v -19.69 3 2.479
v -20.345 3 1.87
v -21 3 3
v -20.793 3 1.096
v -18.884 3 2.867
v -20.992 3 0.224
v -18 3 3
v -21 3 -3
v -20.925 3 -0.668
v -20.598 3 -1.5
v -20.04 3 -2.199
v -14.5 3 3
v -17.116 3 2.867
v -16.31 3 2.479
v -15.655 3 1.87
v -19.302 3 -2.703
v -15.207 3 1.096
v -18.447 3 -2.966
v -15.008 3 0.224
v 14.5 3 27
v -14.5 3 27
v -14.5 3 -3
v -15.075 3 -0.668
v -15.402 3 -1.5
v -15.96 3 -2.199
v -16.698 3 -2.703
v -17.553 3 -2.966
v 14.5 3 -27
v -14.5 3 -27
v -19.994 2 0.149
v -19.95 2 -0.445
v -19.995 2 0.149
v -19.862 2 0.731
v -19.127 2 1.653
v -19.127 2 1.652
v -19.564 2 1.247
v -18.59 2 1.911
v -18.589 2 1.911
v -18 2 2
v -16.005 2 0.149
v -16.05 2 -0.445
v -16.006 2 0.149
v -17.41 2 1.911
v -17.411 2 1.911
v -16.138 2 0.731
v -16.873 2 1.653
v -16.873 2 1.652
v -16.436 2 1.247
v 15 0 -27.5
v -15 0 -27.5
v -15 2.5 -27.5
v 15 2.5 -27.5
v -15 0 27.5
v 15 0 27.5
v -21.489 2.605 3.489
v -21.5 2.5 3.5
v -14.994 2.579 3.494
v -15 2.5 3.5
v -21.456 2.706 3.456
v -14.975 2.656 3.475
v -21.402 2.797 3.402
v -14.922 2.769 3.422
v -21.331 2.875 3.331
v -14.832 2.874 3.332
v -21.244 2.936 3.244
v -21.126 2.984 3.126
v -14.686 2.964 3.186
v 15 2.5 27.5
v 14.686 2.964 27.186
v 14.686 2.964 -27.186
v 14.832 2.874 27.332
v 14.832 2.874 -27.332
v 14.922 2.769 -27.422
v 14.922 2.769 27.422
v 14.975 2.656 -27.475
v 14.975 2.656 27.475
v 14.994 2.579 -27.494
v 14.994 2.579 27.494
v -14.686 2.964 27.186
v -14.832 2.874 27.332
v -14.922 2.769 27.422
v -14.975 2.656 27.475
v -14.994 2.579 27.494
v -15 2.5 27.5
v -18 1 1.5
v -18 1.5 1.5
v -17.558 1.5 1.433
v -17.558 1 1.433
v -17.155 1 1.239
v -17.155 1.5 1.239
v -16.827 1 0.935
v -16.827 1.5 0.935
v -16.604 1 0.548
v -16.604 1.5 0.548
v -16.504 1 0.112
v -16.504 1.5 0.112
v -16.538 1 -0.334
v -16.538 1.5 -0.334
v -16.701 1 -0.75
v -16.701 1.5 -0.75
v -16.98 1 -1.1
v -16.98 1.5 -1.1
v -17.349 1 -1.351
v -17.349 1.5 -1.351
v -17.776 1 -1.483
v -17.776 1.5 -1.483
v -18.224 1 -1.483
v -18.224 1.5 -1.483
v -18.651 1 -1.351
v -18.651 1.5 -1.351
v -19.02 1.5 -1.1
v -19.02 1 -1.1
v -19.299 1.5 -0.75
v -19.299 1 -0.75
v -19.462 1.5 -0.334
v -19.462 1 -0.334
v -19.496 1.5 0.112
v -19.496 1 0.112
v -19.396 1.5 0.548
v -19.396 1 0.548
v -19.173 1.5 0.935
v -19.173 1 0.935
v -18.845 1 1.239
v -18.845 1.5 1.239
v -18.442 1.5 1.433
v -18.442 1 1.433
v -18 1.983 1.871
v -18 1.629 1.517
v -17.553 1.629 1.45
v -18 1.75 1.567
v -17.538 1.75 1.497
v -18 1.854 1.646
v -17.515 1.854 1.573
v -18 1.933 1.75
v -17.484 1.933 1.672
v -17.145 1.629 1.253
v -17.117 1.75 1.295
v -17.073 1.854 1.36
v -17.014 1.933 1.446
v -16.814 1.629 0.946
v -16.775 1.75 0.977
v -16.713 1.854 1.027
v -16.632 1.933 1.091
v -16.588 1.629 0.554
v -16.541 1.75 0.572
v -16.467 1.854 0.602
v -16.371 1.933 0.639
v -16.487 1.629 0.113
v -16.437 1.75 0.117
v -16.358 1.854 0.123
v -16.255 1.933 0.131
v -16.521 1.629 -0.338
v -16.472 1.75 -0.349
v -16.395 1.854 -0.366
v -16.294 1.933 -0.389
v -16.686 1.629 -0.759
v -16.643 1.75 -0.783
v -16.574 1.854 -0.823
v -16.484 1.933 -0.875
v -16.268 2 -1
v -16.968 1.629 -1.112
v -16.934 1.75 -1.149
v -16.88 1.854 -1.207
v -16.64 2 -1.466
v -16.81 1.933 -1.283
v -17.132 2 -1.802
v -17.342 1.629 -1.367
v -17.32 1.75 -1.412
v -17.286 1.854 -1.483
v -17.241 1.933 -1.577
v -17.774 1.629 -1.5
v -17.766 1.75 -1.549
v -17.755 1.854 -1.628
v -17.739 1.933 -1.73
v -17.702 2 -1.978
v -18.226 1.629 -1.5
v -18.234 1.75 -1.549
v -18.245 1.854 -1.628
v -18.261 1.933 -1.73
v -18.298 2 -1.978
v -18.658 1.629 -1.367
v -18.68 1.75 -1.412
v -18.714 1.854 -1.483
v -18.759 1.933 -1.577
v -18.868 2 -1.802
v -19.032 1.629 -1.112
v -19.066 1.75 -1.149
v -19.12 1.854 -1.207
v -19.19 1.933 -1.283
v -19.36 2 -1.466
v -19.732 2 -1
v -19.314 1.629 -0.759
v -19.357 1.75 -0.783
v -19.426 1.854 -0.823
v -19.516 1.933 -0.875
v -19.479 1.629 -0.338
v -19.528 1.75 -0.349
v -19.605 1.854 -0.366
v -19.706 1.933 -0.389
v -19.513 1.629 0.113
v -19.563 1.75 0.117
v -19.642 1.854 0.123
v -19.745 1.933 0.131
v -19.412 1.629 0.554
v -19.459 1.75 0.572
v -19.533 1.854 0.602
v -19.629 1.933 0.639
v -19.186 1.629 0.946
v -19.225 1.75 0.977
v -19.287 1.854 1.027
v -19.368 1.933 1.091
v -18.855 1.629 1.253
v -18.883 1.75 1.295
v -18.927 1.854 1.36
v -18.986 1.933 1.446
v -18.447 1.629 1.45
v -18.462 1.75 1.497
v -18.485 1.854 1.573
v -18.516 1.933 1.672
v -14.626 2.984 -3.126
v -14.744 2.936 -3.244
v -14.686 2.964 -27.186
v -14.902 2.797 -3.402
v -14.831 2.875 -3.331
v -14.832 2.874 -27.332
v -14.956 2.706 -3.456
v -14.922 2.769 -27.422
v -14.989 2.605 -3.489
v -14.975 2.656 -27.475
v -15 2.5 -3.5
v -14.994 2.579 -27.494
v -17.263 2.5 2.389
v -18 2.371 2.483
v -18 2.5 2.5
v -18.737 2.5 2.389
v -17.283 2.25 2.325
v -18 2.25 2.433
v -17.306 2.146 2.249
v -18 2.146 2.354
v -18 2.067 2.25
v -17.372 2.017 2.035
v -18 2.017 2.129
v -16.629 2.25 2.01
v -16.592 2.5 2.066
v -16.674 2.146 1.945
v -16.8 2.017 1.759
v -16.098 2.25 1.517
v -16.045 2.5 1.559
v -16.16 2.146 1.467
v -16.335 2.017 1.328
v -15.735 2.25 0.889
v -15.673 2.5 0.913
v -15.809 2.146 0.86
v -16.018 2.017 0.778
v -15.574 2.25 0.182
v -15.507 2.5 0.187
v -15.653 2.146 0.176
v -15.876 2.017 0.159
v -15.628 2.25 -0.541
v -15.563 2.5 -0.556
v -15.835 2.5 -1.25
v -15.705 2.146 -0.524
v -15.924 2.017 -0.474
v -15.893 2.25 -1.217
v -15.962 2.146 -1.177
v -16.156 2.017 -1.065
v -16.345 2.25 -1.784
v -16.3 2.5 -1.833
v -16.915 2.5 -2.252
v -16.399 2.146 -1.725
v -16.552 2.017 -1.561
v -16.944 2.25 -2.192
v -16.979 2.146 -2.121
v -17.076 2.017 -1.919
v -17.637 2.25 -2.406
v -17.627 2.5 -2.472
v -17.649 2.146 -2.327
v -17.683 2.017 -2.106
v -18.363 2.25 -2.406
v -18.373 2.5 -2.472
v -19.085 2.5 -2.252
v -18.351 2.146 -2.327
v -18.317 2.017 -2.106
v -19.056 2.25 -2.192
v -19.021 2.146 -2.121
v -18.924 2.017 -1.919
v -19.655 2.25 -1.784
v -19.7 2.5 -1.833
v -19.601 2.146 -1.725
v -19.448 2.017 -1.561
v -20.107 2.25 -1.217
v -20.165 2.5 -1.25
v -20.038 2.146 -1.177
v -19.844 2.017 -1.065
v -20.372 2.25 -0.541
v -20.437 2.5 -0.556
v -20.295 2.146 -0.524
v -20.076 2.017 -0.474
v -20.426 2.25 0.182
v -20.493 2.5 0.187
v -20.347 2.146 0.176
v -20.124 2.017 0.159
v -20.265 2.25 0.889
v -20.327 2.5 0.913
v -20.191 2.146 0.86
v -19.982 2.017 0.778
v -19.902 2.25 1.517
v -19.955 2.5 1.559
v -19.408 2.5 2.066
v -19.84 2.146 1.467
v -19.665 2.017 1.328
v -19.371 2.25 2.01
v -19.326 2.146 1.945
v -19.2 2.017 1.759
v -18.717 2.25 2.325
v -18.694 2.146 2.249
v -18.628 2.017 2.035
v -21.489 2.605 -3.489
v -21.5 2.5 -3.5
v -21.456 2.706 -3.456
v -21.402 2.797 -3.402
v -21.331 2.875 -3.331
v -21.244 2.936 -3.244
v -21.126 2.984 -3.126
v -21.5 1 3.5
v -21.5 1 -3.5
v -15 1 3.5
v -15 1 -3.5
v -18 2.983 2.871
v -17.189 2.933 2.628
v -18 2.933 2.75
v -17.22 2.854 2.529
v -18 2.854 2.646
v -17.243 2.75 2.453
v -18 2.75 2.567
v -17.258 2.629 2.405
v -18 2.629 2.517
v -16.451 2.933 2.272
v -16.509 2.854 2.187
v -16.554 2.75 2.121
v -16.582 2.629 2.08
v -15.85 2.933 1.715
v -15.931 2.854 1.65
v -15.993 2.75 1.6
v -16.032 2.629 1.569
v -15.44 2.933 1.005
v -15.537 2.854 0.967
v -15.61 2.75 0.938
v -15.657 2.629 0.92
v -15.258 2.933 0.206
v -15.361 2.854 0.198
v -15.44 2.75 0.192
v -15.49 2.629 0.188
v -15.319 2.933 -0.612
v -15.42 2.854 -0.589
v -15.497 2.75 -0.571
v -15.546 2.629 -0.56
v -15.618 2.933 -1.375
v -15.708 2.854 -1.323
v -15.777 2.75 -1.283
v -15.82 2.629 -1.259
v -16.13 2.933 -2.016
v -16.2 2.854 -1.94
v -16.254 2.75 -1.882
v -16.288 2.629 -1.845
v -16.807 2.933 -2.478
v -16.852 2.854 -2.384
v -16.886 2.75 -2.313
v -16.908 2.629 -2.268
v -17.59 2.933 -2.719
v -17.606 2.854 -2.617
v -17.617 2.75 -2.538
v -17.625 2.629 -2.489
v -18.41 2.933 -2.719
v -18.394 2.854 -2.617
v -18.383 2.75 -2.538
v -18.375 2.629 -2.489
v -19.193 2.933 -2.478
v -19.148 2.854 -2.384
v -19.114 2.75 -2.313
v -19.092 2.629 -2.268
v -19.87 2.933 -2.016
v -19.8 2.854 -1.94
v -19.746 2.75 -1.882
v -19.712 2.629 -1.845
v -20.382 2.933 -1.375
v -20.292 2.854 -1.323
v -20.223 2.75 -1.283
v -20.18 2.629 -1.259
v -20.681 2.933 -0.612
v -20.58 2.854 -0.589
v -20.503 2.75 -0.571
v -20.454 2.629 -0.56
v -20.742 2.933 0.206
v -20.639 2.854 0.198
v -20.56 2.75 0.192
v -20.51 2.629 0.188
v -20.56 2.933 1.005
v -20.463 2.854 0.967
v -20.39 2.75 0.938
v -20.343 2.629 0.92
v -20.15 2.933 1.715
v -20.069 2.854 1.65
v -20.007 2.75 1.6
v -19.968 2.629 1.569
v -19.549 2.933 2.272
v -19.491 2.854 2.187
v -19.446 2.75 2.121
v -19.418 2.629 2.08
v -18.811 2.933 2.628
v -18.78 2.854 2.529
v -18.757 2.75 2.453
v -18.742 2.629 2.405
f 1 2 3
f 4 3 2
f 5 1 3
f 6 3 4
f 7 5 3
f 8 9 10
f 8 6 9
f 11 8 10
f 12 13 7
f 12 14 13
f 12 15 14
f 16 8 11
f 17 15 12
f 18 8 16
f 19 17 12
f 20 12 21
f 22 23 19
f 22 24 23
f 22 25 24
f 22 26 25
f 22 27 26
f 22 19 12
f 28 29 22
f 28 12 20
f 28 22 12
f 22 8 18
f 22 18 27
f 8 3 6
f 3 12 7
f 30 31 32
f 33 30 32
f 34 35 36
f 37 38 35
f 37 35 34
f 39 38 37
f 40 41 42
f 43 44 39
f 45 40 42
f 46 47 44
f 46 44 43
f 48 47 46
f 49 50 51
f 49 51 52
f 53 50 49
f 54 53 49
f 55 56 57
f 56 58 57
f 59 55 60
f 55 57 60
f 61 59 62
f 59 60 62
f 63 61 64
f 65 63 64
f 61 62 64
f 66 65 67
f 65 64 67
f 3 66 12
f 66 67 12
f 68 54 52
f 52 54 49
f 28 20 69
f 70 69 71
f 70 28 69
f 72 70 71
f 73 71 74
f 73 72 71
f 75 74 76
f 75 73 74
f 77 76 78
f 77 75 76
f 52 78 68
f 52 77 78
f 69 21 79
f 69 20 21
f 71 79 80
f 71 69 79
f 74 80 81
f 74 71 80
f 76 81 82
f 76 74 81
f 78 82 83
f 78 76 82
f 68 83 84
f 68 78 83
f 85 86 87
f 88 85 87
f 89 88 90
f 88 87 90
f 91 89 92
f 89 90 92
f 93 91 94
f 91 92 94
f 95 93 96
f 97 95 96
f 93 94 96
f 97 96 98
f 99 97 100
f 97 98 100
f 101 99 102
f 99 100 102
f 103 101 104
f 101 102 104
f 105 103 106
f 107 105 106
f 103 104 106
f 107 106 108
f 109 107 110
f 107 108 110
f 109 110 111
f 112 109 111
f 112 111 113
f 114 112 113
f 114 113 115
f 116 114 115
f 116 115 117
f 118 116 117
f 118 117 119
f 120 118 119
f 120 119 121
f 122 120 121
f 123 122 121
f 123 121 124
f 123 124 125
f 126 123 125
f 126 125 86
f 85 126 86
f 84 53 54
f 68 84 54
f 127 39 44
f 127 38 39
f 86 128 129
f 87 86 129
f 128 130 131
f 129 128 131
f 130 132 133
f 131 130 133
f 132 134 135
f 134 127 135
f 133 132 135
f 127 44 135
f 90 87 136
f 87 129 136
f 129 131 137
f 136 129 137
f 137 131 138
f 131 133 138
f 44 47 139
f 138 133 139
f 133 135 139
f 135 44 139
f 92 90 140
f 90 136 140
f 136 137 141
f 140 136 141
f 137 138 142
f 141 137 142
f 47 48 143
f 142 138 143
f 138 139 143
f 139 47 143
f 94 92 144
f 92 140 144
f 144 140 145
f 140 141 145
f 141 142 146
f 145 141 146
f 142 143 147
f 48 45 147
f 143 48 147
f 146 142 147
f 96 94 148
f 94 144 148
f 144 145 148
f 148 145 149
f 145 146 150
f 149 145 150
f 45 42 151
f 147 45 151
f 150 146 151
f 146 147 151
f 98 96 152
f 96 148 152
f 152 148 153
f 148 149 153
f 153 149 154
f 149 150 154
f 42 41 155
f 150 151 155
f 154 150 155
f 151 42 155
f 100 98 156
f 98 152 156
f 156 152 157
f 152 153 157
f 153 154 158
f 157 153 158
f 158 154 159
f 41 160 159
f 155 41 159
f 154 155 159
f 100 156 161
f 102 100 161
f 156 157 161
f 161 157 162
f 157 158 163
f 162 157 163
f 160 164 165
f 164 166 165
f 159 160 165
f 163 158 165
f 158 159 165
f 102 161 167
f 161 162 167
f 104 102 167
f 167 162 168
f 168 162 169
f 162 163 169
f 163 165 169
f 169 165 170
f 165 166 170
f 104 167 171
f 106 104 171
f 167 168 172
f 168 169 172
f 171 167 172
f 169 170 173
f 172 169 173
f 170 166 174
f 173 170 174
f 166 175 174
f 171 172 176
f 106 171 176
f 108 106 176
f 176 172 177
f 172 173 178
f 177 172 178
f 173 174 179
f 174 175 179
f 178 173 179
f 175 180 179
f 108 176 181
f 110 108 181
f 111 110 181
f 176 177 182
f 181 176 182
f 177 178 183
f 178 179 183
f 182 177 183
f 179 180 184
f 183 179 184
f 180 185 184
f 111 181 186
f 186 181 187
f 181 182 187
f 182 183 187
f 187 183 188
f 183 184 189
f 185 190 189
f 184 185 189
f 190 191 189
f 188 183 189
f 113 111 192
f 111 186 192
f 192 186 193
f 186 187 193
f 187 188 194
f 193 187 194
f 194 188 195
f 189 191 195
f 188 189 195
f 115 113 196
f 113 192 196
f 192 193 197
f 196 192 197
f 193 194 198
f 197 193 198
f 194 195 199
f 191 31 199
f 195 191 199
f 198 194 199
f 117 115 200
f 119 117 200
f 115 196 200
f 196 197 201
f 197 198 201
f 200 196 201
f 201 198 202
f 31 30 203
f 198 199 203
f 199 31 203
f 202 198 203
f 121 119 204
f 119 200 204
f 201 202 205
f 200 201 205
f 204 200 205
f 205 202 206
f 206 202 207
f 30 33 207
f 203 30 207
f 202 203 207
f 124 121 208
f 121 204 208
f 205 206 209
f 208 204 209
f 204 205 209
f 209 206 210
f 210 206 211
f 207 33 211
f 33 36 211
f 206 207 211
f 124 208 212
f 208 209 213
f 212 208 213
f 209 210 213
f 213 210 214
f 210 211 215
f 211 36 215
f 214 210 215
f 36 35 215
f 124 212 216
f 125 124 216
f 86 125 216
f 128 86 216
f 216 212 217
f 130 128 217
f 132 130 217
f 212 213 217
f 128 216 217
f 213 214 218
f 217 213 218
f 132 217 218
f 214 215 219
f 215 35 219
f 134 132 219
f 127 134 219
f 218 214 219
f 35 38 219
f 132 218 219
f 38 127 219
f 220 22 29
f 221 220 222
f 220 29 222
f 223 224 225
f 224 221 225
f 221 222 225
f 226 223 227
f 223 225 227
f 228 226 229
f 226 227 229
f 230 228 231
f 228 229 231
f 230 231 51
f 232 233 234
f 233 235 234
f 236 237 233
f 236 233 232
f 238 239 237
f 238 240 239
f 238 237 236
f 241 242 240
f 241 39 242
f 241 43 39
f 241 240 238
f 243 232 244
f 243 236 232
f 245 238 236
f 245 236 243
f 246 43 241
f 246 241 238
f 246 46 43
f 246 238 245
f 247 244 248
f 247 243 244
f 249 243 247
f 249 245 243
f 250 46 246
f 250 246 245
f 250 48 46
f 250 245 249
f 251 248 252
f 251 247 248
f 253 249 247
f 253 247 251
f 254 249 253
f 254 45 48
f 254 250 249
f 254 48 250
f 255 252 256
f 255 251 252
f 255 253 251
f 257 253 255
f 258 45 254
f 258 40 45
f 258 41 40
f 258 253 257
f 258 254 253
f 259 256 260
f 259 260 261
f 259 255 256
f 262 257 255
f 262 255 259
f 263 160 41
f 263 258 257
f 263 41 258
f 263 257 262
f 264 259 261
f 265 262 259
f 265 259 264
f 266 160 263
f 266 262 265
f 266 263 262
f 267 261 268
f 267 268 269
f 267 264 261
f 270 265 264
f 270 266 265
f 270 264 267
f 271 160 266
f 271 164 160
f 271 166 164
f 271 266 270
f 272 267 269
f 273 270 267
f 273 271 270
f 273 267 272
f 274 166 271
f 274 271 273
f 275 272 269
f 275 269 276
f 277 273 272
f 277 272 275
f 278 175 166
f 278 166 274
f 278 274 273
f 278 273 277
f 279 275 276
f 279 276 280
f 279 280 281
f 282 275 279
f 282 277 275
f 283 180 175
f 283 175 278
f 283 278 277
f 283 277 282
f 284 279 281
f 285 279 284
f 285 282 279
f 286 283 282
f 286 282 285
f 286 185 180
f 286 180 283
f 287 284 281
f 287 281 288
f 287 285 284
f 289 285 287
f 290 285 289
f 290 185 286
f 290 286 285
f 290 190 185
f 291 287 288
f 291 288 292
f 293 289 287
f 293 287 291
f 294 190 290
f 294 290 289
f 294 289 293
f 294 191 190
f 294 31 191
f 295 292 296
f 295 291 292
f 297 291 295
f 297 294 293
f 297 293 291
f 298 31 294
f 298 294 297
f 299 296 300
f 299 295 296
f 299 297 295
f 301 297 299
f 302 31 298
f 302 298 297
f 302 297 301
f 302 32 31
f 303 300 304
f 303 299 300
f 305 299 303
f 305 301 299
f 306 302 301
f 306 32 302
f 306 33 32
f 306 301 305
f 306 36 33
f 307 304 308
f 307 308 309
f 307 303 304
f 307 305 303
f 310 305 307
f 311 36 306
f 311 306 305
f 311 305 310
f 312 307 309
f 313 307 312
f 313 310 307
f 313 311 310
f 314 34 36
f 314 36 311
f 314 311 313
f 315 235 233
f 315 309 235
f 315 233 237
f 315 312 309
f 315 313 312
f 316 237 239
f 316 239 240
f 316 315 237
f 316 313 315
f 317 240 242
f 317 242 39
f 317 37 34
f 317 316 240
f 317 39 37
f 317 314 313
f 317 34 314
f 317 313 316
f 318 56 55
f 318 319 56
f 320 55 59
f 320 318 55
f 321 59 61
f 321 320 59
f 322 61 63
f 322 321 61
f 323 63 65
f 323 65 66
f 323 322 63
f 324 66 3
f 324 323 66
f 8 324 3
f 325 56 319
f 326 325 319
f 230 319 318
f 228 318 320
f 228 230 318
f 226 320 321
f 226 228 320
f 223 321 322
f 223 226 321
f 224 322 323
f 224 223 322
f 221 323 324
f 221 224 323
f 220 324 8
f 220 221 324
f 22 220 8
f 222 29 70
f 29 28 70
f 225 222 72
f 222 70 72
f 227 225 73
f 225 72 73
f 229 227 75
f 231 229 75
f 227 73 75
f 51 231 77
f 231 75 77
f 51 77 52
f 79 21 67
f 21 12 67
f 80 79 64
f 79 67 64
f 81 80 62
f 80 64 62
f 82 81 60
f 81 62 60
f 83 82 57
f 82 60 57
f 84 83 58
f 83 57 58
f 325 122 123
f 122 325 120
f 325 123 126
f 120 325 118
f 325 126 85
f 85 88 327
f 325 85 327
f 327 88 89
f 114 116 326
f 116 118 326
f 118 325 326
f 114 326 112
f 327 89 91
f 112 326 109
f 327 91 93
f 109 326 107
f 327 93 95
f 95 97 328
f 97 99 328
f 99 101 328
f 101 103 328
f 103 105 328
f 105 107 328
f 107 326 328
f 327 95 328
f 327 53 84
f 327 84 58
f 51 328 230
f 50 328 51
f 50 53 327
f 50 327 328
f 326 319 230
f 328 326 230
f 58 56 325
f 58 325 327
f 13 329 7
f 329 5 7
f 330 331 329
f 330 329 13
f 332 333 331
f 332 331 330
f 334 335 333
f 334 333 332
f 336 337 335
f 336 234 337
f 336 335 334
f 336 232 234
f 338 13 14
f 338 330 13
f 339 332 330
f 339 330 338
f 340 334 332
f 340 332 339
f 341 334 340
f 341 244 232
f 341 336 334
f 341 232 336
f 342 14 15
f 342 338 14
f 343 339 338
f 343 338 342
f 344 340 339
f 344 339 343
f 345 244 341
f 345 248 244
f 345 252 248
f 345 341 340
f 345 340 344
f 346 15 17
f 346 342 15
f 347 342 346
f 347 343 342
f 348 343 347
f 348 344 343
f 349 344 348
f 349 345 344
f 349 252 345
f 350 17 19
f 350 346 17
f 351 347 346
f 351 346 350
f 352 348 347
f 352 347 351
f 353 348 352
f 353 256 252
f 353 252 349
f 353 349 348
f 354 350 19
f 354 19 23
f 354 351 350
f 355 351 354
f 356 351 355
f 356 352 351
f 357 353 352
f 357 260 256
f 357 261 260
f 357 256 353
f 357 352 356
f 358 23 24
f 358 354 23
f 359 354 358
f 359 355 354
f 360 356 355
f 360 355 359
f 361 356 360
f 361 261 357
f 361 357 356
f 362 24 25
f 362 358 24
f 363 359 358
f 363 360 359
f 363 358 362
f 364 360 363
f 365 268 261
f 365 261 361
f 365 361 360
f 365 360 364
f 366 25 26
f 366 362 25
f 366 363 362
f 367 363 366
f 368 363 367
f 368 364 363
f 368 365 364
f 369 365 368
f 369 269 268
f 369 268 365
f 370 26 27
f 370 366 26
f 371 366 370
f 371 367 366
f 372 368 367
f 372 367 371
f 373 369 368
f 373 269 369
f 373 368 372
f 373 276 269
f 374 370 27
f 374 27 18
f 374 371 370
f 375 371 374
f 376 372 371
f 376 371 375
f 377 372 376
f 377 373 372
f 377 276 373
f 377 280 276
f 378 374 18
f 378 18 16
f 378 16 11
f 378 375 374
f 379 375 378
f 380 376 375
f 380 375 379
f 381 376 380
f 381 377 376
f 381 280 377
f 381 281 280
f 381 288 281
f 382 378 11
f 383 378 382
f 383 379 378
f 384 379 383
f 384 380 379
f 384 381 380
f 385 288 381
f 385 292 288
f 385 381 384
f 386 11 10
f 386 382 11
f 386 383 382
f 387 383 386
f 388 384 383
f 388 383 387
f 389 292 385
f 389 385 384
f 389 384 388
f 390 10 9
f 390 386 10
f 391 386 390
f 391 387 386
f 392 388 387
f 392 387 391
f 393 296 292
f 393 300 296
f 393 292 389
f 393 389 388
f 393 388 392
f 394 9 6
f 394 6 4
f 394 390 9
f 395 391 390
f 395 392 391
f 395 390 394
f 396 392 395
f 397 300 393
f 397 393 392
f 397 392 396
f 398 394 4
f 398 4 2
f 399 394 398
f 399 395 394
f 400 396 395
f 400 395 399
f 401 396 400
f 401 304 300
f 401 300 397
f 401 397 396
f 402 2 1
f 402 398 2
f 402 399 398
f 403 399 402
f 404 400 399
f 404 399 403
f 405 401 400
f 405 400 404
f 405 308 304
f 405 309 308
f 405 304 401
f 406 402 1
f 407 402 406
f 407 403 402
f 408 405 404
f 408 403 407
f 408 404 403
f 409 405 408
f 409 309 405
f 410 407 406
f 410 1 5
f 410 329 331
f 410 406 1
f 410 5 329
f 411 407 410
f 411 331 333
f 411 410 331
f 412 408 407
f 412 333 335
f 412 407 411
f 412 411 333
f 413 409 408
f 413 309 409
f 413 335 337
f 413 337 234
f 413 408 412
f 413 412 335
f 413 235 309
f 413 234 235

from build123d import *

# Parameters (mm, degrees)
SKETCH1_W           = 30
SKETCH1_H           = 55
BOSS_EXTRUDE1_DEPTH = 3
SKETCH2_W           = 7
SKETCH2_H           = 7
BOSS_EXTRUDE2_DEPTH = 2
SKETCH3_R           = 1.5
CUT_EXTRUDE1_DEPTH  = 2
SKETCH4_R           = 2.5
CUT_EXTRUDE2_DEPTH  = 1
FILLET2_R           = 0.5


with BuildPart() as part:
    # Sketch1 → Boss-Extrude1 (new body)
    with BuildSketch(Plane(origin=(0, 0, 0), x_dir=(1, 0, 0), z_dir=(0, 1, 0))):
        Rectangle(SKETCH1_W, SKETCH1_H)
    extrude(amount=BOSS_EXTRUDE1_DEPTH)

    # Sketch2 → Boss-Extrude2 (add)
    with BuildSketch(Plane(origin=(0, 3, 0), x_dir=(1, 0, 0), z_dir=(0, 1, 0))):
        with Locations((-18, 0)):
            Rectangle(SKETCH2_W, SKETCH2_H)
    extrude(amount=-BOSS_EXTRUDE2_DEPTH)

    # Sketch3 → Cut-Extrude1 (cut)
    with BuildSketch(Plane(origin=(0, 3, 0), x_dir=(1, 0, 0), z_dir=(0, 1, 0))):
        with Locations(Location((-18, 0, 0), (0, 0, 270))):
            Circle(SKETCH3_R)
    extrude(amount=-CUT_EXTRUDE1_DEPTH, mode=Mode.SUBTRACT)

    # Sketch4 → Cut-Extrude2 (cut)
    with BuildSketch(Plane(origin=(0, 3, 0), x_dir=(1, 0, 0), z_dir=(0, 1, 0))):
        with Locations(Location((-18, 0, 0), (0, 0, 270))):
            Circle(SKETCH4_R)
    extrude(amount=-CUT_EXTRUDE2_DEPTH, mode=Mode.SUBTRACT)

    # Fillet2
    fillet2_edges = [part.edges().sort_by_distance(p)[0] for p in [
        (15, 3, 0),
        (-15, 3, 15.5),
        (-18.25, 3, 3.5),
        (0, 3, -27.5),
        (-18.25, 3, -3.5),
        (-21.5, 3, 0),
        (-18, 3, -2.5),
        (-18, 2, -2.5),
        (-18, 2, -1.5),
        (-15, 3, -15.5),
        (0, 3, 27.5),
    ]]
    fillet(fillet2_edges, radius=FILLET2_R - 0.0001)  # a hair under: the kernel refuses the full size


solid = part.part
